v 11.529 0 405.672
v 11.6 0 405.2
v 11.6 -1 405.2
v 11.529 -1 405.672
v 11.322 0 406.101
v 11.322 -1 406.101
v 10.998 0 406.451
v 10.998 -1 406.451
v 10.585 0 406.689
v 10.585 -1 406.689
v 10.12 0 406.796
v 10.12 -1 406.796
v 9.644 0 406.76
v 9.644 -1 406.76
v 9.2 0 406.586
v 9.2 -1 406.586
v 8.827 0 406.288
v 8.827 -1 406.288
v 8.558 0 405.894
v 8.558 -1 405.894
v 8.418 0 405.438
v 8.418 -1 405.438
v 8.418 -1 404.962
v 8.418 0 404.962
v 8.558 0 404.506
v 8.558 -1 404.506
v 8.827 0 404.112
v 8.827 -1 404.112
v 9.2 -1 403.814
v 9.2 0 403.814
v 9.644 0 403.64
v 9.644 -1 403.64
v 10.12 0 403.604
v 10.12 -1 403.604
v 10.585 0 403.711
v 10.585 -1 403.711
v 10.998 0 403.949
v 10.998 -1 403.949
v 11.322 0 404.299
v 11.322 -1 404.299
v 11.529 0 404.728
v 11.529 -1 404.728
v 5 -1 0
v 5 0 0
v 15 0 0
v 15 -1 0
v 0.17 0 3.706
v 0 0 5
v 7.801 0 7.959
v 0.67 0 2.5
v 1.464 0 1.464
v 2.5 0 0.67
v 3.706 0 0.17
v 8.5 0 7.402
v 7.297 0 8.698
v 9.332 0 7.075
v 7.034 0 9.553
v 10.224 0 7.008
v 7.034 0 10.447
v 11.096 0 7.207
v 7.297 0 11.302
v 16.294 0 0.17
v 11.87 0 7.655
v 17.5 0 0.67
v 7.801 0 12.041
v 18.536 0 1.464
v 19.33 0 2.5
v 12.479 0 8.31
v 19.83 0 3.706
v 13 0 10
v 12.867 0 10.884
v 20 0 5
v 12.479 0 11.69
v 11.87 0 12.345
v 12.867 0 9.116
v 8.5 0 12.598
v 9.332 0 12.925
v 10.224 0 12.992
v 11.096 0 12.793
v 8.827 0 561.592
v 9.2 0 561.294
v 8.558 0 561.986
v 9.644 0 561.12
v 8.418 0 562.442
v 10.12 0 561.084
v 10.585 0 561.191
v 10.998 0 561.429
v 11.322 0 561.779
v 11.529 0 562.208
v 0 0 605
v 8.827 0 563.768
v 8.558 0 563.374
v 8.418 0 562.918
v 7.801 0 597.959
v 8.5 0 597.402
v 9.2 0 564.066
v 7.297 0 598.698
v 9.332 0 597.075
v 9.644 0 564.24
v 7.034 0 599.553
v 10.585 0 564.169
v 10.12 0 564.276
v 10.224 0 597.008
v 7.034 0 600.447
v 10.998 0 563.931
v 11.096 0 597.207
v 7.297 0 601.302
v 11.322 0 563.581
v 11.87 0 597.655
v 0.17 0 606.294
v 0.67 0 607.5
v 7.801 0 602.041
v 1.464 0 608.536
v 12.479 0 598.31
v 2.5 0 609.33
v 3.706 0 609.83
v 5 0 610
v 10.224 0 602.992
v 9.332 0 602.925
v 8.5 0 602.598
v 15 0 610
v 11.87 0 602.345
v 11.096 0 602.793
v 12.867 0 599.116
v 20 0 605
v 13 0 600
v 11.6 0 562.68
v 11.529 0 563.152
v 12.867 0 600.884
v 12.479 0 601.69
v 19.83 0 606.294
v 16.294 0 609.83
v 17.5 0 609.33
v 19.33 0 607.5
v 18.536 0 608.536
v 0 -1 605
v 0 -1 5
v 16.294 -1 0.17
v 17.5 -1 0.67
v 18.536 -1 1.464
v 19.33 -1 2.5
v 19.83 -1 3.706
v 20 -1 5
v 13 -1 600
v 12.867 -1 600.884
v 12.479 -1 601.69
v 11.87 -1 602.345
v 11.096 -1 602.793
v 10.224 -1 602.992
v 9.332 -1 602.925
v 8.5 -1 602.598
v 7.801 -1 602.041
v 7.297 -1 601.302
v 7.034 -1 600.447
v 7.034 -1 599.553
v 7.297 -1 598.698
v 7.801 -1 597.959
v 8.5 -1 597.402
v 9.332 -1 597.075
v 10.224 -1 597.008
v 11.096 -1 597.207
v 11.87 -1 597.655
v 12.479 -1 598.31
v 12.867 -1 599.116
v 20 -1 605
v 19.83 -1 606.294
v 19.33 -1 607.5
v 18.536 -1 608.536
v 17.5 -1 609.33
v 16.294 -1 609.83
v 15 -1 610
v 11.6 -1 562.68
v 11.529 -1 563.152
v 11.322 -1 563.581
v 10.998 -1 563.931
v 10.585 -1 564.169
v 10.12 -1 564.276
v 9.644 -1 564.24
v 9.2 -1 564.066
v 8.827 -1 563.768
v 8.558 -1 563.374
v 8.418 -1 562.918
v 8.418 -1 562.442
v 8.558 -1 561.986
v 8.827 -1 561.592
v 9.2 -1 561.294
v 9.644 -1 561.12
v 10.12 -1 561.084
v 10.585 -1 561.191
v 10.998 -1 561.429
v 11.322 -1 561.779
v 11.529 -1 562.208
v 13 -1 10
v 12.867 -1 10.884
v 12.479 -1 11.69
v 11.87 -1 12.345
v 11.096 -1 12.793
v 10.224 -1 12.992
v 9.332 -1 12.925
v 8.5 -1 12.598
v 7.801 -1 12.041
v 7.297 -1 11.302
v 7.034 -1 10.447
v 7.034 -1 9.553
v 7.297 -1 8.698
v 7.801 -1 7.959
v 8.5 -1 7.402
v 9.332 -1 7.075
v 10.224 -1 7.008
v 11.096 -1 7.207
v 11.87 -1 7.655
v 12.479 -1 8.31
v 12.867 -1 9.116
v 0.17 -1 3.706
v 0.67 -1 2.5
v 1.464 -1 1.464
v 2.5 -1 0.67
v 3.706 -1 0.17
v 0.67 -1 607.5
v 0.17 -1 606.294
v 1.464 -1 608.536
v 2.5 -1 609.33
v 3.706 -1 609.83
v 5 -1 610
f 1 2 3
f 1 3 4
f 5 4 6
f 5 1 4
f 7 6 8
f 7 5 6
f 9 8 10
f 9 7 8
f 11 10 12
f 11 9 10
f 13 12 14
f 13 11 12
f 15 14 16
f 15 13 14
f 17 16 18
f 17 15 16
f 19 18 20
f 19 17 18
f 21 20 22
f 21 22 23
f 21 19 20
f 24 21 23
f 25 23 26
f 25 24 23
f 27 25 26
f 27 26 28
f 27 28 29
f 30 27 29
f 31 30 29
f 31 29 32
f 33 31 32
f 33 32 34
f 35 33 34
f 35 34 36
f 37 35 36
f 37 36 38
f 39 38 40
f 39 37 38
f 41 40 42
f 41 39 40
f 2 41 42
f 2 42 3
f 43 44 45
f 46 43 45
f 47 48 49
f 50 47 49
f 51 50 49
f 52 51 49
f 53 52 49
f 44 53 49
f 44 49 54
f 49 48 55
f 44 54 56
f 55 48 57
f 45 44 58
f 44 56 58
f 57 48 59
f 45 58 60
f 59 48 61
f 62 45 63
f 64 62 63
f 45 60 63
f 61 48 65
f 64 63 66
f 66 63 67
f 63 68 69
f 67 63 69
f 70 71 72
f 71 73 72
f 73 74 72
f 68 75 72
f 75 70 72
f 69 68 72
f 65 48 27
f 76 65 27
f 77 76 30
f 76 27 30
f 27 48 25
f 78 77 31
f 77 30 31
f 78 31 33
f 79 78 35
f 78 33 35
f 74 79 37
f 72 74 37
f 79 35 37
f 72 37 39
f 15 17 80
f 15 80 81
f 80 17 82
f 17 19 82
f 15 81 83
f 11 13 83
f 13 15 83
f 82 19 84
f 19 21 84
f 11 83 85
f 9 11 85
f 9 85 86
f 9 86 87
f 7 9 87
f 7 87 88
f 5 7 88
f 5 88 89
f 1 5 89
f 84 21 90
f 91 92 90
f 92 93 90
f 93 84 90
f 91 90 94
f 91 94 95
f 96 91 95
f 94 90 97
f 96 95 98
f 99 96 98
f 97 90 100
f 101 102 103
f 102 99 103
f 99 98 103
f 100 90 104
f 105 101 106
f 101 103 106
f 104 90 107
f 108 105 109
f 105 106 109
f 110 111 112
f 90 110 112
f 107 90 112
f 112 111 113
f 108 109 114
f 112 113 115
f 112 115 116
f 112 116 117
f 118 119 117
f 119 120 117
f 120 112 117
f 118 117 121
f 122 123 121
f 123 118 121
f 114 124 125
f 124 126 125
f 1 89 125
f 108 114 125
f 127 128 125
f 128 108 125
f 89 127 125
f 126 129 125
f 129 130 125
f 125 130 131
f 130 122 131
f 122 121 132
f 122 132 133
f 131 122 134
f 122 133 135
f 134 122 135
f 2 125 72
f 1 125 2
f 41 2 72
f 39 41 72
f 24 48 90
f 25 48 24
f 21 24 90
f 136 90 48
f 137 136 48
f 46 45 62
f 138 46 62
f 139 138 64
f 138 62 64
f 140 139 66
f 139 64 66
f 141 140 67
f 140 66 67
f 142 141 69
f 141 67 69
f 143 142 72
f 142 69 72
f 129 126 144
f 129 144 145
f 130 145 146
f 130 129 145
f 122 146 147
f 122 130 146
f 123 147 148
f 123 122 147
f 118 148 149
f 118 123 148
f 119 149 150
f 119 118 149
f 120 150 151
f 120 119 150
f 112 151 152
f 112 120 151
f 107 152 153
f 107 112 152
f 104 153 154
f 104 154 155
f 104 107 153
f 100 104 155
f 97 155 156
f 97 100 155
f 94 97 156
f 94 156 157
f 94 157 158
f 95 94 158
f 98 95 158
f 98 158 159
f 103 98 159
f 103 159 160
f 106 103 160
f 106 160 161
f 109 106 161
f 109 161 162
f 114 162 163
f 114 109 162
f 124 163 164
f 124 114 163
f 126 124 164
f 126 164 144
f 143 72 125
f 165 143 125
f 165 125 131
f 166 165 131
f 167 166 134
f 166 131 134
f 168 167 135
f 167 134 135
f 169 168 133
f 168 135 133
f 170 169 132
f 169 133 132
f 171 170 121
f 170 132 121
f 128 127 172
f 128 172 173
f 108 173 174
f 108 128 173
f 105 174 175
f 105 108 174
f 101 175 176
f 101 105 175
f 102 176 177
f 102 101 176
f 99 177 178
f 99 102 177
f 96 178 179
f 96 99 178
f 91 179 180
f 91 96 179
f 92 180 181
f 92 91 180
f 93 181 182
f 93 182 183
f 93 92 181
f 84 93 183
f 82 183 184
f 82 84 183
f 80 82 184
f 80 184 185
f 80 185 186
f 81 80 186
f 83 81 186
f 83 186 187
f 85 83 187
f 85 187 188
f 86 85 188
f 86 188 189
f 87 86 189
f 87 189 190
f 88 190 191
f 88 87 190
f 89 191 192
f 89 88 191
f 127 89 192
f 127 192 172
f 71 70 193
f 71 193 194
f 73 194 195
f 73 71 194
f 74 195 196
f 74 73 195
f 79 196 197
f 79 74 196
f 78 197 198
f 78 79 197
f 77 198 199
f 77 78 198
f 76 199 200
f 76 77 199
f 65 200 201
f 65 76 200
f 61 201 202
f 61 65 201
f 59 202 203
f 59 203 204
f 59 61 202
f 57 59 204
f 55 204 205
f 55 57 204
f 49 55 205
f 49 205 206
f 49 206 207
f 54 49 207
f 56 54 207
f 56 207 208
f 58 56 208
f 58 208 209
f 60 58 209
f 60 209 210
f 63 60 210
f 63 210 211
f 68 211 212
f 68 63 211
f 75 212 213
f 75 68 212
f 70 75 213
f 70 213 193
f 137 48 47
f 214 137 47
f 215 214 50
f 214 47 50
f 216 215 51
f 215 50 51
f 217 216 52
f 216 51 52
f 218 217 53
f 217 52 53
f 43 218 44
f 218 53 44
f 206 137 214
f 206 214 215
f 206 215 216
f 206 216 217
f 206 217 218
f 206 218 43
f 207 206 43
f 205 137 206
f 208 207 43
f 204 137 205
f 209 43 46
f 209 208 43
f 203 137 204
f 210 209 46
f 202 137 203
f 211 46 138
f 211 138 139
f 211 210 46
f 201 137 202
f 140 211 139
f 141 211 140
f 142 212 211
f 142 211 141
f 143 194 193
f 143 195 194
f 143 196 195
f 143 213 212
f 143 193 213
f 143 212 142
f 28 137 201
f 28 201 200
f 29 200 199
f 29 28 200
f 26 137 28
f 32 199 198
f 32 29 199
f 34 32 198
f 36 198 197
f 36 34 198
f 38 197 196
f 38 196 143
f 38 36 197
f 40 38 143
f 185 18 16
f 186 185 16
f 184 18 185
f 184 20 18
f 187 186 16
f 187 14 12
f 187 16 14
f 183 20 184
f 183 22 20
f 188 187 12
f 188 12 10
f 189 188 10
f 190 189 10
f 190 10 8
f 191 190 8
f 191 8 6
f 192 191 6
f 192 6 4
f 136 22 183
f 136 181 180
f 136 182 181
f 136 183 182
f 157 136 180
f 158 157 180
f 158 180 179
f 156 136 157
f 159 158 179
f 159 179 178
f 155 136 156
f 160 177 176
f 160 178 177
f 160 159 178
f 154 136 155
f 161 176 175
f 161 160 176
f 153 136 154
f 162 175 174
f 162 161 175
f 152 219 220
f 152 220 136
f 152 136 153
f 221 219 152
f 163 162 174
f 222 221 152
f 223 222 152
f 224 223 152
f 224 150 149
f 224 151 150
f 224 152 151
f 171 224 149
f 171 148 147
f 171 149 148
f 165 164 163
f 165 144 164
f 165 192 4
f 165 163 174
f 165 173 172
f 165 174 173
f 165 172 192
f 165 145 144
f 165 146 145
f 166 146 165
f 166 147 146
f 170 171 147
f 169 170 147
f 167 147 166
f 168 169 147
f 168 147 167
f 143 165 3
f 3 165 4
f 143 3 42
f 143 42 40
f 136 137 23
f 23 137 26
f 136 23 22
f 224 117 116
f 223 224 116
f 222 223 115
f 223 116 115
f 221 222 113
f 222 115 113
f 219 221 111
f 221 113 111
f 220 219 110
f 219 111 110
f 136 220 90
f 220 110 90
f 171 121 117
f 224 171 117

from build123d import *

# Parameters (mm, degrees)
F0_R     = 3
F0_R_2   = 1.6
F1_DEPTH = 1


with BuildPart() as f1:
    # F0 (on Front) → F1 (new body)
    with BuildSketch(Plane.XZ):
        with BuildLine():
            ThreePointArc((0, 5), (1.464466, 1.464466), (5, 0))
            Line((5, 0), (15, 0))
            ThreePointArc((15, 0), (18.535534, 1.464466), (20, 5))
            Line((20, 5), (20, 605))
            ThreePointArc((20, 605), (18.535534, 608.535534), (15, 610))
            Line((15, 610), (5, 610))
            ThreePointArc((5, 610), (1.464466, 608.535534), (0, 605))
            Line((0, 605), (0, 5))
        make_face()
        with Locations((10, 10)):
            Circle(F0_R, mode=Mode.SUBTRACT)
        with Locations((10, 405.2)):
            Circle(F0_R_2, mode=Mode.SUBTRACT)
        with Locations((10, 562.68)):
            Circle(F0_R_2, mode=Mode.SUBTRACT)
        with Locations((10, 600)):
            Circle(F0_R, mode=Mode.SUBTRACT)
    extrude(amount=F1_DEPTH)


solid = f1.part
